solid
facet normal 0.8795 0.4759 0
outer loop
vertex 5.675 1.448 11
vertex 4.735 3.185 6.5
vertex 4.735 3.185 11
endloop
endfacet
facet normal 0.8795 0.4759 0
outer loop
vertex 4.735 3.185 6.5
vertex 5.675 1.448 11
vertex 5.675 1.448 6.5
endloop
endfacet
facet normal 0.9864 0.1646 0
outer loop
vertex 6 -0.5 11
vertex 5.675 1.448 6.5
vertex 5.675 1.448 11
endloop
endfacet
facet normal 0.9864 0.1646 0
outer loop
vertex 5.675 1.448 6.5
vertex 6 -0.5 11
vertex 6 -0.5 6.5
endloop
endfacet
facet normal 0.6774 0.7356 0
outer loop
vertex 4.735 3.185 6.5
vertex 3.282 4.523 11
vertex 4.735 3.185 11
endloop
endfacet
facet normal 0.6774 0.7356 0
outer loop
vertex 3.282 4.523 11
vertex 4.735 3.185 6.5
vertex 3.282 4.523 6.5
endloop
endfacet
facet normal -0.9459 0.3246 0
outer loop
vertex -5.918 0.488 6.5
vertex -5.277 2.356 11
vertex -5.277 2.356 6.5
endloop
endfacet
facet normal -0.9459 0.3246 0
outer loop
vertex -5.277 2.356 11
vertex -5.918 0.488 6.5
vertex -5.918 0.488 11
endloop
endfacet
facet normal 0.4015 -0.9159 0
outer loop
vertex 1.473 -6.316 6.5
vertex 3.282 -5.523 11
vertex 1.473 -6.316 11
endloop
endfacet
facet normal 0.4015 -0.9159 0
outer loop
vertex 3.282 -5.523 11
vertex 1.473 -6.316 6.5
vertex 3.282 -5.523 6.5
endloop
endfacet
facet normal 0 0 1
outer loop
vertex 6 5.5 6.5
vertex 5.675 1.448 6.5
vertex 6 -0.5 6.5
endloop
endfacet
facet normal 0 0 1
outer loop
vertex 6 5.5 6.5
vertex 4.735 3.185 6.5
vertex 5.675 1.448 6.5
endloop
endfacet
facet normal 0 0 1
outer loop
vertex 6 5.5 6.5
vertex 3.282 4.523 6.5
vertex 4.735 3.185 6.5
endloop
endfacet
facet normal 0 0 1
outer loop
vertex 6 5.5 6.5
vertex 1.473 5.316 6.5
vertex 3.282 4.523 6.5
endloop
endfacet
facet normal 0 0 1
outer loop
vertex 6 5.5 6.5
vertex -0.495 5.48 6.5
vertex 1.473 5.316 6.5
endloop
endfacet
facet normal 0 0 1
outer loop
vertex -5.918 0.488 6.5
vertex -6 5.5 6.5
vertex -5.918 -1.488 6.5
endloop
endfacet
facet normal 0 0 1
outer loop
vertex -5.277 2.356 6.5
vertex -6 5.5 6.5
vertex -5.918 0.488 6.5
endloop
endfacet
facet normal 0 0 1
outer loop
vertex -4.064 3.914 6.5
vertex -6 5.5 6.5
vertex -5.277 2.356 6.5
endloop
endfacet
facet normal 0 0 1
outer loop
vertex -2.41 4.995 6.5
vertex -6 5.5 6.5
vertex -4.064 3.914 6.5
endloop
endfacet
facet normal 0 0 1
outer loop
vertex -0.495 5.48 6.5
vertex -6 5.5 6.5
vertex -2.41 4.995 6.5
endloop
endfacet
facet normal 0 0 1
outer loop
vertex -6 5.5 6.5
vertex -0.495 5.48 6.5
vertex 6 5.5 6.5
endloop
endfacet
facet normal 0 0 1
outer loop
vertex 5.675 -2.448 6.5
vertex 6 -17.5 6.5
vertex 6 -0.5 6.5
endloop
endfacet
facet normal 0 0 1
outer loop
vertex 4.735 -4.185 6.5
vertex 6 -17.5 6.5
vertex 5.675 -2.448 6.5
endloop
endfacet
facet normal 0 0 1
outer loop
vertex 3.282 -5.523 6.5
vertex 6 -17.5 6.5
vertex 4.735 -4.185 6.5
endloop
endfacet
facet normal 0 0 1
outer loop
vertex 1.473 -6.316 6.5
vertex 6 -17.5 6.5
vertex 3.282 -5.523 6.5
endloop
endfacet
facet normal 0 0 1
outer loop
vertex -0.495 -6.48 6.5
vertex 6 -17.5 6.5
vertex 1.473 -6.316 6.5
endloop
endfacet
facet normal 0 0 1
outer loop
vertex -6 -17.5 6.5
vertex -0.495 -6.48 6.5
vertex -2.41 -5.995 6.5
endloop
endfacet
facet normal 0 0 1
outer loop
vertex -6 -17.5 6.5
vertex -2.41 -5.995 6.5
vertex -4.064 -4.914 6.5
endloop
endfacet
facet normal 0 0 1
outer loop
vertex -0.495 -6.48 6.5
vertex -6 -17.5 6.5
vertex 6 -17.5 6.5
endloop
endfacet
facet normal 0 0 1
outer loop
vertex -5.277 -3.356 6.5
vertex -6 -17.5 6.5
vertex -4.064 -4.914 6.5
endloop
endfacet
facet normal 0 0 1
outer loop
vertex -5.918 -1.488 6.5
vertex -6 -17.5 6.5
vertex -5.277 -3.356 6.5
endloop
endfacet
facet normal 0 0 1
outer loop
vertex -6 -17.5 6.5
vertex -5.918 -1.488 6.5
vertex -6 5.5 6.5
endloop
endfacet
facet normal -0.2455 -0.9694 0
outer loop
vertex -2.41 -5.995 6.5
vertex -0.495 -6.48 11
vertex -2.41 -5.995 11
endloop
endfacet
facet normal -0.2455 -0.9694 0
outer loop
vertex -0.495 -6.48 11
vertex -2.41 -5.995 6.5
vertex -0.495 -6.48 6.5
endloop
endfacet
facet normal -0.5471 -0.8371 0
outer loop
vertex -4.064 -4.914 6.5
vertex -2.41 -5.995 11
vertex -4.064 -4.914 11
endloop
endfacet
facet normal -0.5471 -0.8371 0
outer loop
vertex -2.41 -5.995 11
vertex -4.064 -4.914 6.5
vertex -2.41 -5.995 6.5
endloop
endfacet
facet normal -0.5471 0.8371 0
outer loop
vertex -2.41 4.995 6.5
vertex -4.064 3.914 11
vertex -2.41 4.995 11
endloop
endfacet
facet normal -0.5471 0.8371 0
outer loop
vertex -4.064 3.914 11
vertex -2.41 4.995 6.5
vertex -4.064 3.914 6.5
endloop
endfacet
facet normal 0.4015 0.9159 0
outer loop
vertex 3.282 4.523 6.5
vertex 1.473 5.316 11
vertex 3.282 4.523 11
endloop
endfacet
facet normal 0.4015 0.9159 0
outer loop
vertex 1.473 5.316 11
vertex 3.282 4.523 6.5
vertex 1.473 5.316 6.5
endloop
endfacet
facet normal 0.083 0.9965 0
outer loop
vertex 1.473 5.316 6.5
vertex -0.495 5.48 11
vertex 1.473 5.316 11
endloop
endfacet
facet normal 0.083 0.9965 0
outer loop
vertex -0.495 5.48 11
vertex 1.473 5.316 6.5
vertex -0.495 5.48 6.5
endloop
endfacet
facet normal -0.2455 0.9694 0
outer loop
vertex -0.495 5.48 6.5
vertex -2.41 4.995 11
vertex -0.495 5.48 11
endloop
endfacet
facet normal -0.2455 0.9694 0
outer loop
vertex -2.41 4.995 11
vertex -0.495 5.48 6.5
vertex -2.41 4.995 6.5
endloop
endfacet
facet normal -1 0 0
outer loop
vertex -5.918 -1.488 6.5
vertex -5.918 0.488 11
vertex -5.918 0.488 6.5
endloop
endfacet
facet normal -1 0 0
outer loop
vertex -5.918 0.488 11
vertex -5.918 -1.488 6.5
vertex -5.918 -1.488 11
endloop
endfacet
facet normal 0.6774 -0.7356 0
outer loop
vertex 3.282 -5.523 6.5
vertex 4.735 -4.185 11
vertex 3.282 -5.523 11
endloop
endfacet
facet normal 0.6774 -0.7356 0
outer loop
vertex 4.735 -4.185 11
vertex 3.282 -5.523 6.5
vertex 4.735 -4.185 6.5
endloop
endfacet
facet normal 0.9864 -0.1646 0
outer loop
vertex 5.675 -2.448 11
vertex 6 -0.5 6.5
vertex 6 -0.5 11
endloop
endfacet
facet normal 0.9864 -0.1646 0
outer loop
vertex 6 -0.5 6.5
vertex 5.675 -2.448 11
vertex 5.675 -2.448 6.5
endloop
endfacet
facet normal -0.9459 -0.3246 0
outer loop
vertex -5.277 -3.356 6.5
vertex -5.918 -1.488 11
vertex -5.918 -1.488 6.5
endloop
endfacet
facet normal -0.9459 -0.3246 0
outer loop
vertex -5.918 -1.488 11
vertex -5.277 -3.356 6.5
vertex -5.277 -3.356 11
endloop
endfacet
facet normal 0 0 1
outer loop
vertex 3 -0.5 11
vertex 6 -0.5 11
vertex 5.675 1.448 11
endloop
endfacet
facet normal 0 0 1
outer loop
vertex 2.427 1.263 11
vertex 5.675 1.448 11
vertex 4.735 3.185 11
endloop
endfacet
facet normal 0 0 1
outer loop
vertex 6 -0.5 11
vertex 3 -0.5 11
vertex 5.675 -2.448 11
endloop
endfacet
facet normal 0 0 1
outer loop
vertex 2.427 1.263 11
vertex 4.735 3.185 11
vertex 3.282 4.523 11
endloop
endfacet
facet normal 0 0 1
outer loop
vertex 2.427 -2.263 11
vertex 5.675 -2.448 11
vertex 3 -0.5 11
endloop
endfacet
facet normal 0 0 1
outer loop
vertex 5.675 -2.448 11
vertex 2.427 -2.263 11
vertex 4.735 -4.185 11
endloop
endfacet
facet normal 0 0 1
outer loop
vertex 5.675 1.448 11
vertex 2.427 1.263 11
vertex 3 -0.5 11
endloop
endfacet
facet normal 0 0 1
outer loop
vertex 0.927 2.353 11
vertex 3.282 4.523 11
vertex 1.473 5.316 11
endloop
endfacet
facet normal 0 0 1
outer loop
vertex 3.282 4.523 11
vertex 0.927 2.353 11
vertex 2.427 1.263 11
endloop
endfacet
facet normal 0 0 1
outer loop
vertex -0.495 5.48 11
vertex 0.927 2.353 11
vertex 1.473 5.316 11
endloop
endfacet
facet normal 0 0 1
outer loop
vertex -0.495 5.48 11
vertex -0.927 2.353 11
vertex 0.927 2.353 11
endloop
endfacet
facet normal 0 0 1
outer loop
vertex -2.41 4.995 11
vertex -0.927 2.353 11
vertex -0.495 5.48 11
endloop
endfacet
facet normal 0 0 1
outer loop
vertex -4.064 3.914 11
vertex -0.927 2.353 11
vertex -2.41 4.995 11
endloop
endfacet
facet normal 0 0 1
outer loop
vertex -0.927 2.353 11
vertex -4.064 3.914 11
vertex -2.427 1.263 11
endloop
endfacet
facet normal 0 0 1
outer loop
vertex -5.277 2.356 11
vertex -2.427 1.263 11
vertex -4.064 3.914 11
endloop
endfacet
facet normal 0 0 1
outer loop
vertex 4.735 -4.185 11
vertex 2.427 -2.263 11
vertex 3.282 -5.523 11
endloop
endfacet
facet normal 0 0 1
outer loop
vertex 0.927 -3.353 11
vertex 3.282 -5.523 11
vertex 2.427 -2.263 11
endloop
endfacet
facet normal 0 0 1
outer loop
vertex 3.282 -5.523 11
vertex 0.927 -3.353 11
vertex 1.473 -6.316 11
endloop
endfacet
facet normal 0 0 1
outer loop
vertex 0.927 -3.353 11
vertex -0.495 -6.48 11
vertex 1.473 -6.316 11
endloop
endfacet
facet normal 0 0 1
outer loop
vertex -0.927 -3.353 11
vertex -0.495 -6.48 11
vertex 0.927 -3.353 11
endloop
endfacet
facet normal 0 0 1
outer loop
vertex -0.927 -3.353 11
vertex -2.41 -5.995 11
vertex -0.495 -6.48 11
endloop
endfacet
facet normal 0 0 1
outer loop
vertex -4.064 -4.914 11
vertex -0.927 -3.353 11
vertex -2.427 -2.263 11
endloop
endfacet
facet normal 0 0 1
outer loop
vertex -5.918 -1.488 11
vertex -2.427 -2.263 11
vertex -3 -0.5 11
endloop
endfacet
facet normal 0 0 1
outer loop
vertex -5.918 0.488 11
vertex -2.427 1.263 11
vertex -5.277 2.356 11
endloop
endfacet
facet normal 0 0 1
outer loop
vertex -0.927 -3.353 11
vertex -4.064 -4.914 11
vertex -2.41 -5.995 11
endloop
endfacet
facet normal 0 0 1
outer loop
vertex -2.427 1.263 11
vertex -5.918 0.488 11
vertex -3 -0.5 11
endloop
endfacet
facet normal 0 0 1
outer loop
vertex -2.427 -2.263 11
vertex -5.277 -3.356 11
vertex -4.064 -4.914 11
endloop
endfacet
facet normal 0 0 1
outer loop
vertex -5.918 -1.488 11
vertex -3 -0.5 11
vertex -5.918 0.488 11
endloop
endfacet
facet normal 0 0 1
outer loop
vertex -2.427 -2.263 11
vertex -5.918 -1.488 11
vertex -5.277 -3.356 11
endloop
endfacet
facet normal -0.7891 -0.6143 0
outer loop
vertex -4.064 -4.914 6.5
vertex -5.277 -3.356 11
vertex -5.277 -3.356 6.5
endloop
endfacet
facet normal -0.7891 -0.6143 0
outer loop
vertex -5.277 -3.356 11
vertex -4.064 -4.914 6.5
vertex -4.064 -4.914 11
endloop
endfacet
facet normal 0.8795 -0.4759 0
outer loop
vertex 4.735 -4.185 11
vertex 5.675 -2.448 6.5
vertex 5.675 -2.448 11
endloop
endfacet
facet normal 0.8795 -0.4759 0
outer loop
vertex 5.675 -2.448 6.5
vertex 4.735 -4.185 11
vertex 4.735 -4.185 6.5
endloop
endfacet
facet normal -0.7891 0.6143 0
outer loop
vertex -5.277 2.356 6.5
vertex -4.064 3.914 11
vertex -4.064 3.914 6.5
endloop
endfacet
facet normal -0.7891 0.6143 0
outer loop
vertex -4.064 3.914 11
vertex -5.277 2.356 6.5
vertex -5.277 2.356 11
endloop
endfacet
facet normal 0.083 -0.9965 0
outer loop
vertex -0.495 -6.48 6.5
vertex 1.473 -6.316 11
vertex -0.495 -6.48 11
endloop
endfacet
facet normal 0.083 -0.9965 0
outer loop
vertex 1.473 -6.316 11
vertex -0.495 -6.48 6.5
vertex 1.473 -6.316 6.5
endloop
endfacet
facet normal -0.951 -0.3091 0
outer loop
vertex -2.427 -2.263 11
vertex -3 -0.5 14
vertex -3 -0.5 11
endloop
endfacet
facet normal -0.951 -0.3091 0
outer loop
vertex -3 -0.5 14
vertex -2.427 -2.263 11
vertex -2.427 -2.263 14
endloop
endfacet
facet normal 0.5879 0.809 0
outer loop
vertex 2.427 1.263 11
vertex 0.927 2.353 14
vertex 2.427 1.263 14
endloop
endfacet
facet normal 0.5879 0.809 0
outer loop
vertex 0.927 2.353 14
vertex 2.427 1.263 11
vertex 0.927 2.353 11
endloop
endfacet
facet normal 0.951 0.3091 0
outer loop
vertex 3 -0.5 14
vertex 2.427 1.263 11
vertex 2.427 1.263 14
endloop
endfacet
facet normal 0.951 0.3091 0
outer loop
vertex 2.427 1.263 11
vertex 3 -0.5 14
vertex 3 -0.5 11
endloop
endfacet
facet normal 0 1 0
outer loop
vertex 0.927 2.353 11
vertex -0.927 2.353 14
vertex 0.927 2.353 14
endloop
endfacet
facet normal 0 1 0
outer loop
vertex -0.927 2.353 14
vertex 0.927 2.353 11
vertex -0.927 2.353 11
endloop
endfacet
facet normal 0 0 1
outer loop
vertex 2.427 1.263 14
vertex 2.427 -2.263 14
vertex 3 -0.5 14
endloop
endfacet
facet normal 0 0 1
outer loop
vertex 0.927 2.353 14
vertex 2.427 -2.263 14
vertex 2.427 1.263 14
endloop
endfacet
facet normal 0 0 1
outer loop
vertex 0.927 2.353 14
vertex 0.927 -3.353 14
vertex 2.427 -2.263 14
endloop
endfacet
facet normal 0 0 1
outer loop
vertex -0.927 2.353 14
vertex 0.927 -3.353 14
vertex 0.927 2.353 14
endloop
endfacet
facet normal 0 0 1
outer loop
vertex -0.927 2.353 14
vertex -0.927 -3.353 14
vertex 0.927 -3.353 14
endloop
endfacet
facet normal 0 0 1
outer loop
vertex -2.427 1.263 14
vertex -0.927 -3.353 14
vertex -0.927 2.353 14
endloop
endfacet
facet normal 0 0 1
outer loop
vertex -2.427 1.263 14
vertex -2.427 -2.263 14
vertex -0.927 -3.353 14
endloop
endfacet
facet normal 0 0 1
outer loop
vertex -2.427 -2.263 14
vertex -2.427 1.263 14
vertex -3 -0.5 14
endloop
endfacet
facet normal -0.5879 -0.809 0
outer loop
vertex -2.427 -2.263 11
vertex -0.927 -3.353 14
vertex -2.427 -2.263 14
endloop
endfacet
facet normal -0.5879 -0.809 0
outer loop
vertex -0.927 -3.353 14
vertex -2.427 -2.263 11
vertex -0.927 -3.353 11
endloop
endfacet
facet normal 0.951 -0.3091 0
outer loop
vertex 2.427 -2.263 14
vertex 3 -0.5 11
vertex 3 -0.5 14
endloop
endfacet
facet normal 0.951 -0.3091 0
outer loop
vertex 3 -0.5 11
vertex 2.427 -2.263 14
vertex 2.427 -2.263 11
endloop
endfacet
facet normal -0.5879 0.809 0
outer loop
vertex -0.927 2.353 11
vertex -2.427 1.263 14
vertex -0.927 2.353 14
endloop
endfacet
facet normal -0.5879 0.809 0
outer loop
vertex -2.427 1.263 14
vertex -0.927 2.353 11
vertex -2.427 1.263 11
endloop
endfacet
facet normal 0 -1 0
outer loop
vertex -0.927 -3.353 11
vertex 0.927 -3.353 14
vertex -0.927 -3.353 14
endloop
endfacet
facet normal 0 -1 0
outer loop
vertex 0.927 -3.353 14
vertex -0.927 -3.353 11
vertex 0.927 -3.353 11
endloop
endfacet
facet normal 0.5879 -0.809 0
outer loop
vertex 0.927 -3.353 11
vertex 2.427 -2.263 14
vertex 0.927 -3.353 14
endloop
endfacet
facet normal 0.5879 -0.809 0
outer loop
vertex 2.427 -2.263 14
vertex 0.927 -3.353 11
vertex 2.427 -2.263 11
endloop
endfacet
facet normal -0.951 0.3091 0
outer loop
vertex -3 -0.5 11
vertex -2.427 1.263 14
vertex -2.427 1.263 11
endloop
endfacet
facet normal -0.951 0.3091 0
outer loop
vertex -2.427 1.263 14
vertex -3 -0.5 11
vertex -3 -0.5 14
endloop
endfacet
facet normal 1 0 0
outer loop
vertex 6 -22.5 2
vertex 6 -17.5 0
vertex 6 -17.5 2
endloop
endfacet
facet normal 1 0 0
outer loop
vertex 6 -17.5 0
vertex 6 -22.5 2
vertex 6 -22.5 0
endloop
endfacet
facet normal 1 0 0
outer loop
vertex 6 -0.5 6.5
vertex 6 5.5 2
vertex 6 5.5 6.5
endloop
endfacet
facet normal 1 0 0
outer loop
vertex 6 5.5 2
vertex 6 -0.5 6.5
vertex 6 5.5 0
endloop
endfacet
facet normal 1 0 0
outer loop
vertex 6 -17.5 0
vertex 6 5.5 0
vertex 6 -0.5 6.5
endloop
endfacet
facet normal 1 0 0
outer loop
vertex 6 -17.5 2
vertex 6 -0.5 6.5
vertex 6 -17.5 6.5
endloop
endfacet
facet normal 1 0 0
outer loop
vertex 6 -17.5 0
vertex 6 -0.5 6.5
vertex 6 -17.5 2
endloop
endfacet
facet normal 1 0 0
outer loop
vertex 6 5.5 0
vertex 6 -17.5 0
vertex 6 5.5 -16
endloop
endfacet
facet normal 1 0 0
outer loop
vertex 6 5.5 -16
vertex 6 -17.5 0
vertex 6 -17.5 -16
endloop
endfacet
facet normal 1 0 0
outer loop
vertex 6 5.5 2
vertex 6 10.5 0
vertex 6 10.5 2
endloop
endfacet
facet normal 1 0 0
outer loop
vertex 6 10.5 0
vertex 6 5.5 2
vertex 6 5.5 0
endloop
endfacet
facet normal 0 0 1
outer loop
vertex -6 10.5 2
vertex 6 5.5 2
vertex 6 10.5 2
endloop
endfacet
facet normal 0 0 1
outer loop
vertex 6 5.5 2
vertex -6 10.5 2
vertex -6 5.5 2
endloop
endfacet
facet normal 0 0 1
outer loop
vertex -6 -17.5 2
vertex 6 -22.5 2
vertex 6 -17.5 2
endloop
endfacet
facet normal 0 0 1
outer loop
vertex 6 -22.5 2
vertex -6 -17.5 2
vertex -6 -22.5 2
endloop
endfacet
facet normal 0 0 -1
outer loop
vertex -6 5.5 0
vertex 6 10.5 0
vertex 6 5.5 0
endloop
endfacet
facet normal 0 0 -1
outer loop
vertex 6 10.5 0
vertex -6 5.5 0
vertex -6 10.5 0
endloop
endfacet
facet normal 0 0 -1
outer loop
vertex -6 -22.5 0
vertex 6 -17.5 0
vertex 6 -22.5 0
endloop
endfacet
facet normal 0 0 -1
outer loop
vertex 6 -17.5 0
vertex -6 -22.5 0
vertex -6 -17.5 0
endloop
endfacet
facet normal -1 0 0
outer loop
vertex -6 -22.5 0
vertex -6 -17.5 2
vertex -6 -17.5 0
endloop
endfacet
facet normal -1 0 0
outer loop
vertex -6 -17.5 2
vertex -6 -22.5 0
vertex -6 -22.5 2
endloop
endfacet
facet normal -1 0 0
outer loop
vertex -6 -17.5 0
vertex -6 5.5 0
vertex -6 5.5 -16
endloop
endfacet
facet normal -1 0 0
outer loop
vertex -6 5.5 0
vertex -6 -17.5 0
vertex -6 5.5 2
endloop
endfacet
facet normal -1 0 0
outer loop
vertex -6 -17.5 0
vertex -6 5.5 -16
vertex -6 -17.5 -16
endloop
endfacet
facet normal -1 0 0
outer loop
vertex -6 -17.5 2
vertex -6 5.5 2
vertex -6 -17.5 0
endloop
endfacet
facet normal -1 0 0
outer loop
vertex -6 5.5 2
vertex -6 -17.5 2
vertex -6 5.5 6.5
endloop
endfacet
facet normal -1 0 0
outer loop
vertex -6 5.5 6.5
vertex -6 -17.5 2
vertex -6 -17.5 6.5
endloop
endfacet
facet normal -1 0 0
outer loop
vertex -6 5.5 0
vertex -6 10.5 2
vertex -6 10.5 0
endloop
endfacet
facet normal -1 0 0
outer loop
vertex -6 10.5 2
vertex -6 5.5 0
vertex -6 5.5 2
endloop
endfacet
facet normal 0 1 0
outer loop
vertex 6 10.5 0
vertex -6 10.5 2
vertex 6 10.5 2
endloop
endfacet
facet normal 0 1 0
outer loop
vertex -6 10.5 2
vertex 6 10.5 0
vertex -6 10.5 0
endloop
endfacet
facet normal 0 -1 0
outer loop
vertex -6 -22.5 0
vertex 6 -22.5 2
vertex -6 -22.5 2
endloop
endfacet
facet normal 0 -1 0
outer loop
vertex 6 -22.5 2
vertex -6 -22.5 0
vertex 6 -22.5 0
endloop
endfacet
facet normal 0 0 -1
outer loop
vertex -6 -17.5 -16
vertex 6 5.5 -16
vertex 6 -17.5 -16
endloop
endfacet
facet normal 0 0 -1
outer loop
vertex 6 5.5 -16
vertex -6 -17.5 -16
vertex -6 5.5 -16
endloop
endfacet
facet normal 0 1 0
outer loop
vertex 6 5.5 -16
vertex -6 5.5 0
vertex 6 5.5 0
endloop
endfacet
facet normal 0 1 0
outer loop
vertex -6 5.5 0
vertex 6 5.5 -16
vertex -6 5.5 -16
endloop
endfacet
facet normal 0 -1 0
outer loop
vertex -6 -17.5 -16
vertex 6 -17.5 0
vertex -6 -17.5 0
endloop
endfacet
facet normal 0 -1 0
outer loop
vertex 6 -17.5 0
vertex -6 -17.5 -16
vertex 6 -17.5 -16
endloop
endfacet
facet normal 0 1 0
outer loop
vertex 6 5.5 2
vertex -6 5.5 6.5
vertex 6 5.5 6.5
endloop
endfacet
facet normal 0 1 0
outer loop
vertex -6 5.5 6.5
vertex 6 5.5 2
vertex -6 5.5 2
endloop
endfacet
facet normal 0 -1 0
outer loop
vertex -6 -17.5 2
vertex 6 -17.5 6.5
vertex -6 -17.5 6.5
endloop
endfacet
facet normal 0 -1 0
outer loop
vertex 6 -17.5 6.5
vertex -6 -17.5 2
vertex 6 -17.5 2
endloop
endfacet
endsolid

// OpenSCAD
// 3dof quad
//
// servo

module
servo(a = 30,
      b = 23,
      c = 27,
      d = 12,
      e = 33,
      f = 16,
      flange_thickness = 2,
      top_cap_pct = 0.5)
{
    rem_height = c - flange_thickness - f;
    top_cap_height = rem_height * top_cap_pct;
    roundel_height = rem_height * (1.0 - top_cap_pct);

    translate([ 0, -d / 2, 0 ]) union()
    {
        translate([ 0, 0, flange_thickness / 2 ])
            cube([ d, e, flange_thickness ], center = true);
        translate([ 0, 0, -f / 2 ]) cube([ d, b, f ], center = true);
        translate([ 0, 0, flange_thickness + top_cap_height / 2 ])
            cube([ d, b, top_cap_height ], center = true);
        translate(
            [ 0, b / 2 - d / 2, flange_thickness + top_cap_height ]) union()
        {
            cylinder(r = d / 2, h = roundel_height);
            translate([ 0, 0, roundel_height ]) cylinder(r = 3, h = 3);
        }
    }
}

color("blue") servo();
